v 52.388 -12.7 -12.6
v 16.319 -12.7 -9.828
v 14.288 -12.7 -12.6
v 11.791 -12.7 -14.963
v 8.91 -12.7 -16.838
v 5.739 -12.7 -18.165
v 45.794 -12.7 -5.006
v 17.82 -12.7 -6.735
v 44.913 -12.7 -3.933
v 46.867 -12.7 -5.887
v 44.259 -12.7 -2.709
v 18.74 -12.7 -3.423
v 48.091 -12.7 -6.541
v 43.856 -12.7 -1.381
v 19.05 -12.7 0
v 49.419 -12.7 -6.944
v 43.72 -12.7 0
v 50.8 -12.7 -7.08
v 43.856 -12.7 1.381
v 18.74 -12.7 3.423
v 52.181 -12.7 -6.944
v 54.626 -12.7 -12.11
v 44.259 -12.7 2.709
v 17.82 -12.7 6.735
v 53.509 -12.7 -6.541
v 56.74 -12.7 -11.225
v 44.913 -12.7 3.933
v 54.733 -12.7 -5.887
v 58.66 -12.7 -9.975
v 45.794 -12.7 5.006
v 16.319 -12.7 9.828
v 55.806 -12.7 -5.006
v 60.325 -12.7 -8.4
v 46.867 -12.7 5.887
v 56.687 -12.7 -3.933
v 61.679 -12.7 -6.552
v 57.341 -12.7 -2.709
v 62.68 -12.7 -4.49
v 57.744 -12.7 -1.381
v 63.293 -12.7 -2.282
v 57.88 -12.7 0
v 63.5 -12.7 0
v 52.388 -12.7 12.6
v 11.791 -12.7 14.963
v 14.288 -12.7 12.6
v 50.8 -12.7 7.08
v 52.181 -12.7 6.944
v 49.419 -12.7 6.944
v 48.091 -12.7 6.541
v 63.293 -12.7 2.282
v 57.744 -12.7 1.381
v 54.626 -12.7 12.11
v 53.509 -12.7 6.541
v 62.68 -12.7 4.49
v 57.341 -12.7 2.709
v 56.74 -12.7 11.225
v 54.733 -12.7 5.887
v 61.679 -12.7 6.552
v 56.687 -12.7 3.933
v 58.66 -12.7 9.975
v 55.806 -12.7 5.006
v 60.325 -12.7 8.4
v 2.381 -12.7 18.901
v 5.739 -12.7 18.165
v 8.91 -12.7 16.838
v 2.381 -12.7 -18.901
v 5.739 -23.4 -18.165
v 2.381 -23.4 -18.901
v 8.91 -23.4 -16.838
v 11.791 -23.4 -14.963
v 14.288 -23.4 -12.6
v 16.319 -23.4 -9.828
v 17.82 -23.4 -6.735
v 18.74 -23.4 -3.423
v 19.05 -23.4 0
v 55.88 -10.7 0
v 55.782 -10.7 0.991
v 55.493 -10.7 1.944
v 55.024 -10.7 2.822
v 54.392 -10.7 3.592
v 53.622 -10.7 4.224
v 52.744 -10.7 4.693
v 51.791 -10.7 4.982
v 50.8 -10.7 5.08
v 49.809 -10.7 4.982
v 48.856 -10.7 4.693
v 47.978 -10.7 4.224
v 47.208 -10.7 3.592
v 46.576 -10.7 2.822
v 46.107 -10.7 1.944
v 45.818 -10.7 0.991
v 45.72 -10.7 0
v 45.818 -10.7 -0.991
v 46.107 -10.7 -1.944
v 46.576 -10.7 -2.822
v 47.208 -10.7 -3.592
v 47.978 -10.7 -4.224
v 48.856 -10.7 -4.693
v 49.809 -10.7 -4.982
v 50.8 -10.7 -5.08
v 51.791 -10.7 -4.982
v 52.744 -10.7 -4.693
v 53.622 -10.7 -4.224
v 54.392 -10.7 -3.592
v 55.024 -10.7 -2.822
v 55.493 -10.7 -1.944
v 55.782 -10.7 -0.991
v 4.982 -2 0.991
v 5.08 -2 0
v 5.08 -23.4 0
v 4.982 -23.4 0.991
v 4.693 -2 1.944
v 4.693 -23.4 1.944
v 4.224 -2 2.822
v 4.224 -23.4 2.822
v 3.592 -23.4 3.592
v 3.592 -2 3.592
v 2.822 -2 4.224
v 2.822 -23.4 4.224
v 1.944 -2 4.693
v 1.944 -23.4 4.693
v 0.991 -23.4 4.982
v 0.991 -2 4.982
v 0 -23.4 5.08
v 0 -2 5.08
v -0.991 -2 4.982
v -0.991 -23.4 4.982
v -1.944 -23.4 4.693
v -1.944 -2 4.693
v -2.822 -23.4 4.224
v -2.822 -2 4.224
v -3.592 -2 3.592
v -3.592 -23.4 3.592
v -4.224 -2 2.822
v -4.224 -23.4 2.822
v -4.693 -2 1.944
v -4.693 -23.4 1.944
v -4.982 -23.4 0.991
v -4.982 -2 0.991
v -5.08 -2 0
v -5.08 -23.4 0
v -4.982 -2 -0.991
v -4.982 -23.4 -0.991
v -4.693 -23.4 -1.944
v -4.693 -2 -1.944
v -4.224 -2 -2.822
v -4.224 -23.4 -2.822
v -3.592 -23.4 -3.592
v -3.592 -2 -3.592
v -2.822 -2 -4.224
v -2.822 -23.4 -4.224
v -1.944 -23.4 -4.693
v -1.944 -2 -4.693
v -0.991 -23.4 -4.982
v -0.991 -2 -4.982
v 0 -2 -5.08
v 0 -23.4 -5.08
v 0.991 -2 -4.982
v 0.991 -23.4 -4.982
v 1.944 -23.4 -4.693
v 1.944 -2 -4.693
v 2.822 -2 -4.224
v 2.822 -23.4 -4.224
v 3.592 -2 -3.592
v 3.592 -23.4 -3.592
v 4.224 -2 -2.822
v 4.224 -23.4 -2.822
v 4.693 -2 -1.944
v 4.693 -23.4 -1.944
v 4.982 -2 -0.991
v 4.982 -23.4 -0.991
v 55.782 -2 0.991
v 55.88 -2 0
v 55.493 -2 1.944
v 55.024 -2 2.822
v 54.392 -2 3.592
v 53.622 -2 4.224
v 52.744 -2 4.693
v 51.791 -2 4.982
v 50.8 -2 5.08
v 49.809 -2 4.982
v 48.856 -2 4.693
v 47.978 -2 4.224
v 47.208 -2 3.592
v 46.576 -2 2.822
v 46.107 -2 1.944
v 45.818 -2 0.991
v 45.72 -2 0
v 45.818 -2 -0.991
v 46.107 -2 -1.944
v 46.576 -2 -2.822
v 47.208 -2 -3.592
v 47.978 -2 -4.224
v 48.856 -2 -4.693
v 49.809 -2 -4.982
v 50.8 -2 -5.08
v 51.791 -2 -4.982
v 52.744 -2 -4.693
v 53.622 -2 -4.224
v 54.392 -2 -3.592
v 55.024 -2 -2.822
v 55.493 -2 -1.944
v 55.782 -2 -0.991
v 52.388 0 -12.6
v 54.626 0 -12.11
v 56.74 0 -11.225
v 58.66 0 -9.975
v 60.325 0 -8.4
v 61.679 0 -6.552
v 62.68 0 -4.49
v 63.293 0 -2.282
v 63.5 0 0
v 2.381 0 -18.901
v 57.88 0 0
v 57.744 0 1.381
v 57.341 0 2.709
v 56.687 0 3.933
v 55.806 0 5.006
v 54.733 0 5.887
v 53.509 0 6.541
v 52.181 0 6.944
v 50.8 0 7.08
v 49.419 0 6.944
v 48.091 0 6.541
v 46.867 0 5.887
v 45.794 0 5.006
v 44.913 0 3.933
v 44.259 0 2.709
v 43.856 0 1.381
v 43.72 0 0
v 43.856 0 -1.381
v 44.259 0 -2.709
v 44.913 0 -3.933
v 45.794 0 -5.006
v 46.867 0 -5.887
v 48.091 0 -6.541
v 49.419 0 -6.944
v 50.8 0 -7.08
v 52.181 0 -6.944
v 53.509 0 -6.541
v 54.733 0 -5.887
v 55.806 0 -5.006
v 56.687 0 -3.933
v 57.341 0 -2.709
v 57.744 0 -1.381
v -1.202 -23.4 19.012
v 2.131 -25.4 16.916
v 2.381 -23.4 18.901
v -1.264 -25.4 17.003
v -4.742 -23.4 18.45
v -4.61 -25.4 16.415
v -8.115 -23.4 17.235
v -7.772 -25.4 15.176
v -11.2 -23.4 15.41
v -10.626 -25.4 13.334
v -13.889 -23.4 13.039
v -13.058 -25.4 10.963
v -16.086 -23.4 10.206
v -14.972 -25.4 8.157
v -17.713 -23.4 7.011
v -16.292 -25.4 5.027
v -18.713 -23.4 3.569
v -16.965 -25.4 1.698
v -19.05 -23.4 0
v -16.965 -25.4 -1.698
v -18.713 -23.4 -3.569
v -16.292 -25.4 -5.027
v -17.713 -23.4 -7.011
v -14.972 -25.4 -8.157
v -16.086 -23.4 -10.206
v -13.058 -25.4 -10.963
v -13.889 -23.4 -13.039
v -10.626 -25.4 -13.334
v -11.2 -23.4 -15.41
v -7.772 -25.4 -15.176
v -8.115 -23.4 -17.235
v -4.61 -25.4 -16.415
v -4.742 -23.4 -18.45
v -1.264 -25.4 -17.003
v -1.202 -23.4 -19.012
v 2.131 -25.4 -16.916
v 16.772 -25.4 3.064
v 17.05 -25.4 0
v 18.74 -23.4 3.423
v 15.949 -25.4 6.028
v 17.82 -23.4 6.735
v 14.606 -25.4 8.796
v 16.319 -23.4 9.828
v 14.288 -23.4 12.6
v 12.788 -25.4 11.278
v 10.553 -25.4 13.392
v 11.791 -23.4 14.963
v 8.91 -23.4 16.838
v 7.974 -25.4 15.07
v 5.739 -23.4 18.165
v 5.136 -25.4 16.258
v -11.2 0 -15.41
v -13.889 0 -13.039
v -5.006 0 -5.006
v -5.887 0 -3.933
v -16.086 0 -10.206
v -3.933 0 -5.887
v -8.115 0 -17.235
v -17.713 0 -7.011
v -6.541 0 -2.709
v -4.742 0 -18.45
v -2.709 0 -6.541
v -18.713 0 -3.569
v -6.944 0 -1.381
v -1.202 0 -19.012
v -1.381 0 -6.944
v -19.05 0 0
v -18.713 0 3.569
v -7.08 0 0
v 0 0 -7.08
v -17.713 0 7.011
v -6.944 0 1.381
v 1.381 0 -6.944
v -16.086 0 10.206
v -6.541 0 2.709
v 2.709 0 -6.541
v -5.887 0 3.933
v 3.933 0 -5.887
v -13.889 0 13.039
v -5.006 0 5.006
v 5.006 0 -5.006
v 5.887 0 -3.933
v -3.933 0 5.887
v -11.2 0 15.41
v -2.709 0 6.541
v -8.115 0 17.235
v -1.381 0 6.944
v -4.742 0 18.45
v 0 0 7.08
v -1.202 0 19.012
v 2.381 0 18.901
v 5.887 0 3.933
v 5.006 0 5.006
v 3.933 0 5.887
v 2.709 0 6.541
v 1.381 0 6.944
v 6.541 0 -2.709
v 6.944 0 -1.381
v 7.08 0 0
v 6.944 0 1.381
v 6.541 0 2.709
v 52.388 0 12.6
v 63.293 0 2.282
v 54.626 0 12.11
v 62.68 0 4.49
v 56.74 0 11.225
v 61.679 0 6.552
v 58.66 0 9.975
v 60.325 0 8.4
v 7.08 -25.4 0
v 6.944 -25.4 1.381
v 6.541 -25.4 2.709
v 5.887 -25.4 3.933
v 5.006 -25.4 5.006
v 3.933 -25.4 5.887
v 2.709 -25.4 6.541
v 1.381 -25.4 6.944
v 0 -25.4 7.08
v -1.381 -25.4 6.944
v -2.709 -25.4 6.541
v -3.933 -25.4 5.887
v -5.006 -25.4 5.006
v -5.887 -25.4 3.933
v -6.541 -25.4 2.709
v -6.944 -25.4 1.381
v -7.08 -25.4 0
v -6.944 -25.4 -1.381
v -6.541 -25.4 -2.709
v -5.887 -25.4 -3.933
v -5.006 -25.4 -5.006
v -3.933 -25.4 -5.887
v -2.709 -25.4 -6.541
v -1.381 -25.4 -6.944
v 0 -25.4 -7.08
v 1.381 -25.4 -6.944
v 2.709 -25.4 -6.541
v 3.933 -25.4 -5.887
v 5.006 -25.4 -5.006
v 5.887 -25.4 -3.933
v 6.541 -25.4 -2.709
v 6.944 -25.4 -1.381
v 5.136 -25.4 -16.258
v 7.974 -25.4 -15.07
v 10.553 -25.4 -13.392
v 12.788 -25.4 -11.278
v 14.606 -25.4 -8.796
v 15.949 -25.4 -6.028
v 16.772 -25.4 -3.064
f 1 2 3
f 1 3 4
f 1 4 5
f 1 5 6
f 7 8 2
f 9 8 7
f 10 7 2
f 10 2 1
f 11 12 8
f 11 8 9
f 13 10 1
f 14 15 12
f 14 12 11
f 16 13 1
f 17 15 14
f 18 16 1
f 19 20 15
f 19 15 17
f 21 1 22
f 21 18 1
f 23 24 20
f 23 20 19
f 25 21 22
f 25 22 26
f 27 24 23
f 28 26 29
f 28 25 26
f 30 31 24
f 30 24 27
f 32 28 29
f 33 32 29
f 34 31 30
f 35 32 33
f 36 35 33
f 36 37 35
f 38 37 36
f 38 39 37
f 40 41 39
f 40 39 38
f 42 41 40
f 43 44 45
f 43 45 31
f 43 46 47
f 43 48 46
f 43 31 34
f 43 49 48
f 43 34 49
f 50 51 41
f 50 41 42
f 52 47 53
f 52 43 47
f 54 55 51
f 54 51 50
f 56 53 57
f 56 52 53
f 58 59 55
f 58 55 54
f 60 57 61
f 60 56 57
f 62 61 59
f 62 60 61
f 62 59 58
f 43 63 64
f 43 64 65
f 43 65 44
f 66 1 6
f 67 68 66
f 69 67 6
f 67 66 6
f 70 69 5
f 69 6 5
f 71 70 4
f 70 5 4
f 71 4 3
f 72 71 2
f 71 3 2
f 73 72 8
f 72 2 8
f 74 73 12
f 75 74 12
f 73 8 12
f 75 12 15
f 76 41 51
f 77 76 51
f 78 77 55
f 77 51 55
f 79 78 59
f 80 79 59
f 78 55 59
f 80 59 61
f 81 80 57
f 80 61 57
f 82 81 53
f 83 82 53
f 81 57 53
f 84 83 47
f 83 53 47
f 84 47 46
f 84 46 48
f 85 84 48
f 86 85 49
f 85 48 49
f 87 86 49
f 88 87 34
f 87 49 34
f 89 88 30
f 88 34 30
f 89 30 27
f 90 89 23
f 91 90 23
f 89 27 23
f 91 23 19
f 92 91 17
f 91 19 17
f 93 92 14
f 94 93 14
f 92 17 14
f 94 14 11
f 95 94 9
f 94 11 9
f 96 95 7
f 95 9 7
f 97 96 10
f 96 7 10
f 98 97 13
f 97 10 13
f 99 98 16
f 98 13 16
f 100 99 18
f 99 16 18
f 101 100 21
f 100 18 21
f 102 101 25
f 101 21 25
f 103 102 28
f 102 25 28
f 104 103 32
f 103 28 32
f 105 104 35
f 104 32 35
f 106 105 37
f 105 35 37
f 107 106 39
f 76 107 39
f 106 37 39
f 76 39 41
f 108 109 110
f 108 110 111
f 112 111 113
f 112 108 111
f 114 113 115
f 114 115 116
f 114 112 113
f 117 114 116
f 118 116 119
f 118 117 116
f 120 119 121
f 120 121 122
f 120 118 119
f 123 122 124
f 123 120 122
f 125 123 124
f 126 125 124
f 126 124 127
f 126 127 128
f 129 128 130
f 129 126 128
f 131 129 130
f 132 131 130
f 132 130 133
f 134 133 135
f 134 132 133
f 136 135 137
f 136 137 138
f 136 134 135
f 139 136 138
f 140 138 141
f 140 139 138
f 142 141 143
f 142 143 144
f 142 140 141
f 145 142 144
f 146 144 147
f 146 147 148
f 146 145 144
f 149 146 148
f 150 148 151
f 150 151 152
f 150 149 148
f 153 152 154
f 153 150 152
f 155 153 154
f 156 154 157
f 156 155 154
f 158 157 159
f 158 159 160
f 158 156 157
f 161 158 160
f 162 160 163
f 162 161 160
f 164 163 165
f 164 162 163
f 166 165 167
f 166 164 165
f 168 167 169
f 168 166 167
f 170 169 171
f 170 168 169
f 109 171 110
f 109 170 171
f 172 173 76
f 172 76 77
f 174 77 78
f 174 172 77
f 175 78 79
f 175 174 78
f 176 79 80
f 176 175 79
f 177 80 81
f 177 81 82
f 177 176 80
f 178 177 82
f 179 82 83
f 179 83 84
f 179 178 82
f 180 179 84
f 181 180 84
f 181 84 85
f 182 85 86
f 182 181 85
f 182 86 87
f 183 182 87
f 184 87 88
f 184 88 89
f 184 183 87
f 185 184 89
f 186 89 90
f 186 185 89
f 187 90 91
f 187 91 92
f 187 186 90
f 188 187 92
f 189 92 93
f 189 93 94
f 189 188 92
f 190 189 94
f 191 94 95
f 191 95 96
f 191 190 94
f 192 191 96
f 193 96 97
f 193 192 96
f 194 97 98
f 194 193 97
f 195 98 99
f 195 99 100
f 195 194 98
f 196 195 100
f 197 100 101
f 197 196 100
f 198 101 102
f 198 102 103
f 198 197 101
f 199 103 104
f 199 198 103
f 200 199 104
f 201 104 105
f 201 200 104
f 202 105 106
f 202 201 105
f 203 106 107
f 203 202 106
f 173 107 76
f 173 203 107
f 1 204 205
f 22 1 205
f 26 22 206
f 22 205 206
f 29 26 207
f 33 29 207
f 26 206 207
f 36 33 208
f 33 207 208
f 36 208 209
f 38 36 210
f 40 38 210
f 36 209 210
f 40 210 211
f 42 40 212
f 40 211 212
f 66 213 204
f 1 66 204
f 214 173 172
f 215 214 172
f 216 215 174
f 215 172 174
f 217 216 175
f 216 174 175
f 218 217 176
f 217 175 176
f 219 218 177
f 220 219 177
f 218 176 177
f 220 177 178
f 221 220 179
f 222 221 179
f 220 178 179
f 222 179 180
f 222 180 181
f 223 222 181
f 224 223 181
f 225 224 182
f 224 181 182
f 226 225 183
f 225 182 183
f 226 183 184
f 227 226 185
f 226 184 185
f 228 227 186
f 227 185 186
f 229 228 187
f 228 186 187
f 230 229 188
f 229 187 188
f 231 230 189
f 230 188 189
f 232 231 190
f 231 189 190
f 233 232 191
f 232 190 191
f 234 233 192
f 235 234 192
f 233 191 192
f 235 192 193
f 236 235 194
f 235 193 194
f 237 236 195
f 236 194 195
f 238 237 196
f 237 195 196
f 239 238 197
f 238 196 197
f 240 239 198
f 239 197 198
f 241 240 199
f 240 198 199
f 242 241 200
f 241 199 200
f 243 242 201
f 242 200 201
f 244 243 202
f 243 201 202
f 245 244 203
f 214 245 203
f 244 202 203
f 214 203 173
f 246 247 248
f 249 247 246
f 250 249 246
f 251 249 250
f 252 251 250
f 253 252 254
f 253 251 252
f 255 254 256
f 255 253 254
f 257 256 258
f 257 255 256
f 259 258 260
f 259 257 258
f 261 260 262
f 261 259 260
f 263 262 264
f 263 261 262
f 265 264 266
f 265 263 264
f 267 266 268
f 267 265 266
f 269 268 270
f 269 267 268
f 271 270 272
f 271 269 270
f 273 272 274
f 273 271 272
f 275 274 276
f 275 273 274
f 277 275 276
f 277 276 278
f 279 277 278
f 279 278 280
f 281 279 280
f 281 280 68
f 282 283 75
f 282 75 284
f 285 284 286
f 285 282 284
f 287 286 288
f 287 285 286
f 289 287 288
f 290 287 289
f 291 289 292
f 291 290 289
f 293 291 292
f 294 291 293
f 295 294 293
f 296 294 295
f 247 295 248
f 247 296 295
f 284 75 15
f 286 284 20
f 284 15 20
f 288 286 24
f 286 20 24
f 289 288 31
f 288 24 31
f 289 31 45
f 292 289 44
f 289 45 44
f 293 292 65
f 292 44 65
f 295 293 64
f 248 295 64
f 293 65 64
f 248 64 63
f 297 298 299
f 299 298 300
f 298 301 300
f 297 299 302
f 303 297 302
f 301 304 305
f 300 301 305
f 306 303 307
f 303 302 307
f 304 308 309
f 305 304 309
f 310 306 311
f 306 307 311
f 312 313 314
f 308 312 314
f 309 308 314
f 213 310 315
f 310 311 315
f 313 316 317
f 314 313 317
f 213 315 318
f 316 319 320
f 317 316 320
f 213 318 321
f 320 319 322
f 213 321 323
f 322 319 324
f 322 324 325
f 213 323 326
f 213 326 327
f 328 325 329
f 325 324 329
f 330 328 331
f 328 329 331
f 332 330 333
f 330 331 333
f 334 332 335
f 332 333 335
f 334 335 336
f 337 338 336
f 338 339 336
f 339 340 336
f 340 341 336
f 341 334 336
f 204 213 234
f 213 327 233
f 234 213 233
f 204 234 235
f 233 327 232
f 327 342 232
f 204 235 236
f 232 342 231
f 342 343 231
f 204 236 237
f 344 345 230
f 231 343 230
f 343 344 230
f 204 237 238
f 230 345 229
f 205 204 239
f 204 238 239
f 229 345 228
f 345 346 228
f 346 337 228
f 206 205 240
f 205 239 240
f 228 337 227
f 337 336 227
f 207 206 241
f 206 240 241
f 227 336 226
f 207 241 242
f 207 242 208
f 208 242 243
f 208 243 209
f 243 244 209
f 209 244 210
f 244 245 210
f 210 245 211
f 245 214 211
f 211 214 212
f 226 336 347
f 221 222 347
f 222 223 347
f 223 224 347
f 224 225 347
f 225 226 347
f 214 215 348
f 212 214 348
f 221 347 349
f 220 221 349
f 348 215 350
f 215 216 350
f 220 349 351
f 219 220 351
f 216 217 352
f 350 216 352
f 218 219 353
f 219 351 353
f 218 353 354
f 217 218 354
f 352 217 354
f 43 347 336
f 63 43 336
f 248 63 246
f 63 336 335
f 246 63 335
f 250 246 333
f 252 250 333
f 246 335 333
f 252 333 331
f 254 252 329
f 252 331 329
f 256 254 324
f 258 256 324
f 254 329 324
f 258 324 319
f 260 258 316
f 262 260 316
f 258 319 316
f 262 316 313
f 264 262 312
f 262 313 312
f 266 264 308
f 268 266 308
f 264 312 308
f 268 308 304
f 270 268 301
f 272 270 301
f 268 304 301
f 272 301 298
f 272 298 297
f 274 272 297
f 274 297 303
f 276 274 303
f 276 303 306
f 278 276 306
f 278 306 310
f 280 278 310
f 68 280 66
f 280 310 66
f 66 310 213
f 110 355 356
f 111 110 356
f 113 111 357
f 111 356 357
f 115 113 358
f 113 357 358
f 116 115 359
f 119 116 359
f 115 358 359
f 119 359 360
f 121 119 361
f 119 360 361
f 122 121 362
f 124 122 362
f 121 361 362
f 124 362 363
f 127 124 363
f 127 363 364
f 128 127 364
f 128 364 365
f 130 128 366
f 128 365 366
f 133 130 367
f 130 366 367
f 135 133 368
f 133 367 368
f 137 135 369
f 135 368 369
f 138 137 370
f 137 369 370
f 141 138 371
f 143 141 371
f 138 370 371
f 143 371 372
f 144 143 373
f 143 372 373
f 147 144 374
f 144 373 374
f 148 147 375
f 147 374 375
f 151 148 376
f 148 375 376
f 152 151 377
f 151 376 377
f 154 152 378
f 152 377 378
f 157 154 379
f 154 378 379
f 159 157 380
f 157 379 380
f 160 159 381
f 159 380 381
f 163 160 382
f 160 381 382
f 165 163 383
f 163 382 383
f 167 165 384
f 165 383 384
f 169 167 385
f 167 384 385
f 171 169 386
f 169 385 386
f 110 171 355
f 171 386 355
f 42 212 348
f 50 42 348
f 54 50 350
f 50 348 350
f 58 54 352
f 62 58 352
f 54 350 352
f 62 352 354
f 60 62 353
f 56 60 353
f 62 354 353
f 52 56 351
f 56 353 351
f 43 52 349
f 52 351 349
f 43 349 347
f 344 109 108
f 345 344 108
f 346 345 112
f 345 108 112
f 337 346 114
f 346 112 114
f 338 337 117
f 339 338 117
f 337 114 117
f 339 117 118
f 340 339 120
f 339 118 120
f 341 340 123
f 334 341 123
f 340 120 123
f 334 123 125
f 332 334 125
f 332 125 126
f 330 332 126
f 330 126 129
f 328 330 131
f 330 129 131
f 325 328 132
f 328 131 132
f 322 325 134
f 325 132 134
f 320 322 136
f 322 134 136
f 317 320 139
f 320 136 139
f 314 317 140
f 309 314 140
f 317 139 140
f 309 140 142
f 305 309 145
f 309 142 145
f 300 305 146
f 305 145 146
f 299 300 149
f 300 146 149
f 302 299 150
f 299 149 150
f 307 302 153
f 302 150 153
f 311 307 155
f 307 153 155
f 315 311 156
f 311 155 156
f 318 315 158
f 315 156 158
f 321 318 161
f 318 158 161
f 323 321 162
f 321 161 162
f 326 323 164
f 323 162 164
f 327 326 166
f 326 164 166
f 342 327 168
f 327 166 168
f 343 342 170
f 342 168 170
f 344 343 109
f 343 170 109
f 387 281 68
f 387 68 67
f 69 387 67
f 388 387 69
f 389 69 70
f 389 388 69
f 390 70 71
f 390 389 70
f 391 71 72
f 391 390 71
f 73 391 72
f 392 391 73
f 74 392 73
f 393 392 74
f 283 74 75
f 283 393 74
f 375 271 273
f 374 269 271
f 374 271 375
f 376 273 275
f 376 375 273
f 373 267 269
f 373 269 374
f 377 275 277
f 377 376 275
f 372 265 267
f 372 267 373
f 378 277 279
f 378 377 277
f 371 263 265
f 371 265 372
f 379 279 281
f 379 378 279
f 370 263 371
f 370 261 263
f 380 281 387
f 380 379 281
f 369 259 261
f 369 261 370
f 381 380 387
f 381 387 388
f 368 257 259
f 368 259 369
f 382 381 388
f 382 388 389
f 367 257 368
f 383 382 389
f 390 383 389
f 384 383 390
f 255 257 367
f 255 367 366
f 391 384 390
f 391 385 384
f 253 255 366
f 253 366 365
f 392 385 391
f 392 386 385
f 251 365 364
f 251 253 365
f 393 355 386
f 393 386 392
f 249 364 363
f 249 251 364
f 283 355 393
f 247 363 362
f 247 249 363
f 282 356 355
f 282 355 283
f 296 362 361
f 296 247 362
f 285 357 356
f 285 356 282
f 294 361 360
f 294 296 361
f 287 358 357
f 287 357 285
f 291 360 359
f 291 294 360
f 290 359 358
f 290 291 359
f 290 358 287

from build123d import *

# Parameters (mm, degrees)
F0_R     = 5.08
F1_DEPTH = 12.7
F2_DEPTH = 25.4
F3_SIZE  = 2


with BuildPart() as f1:
    # F0 (on Front) → F1 (new body)
    with BuildSketch(Plane.XZ):
        with BuildLine():
            ThreePointArc((2.38125, -18.900586), (14.2875, -12.600391), (19.05, 0))
            ThreePointArc((19.05, 0), (14.2875, 12.600391), (2.38125, 18.900586))
            ThreePointArc((2.38125, 18.900586), (-19.05, 0), (2.38125, -18.900586))
        make_face()
        Circle(F0_R, mode=Mode.SUBTRACT)
        with BuildLine():
            ThreePointArc((2.38125, 18.900586), (14.2875, 12.600391), (19.05, 0))
            ThreePointArc((19.05, 0), (14.2875, -12.600391), (2.38125, -18.900586))
            Line((2.38125, -18.900586), (52.3875, -12.600391))
            ThreePointArc((52.3875, -12.600391), (38.1, 0), (52.3875, 12.600391))
            Line((52.3875, 12.600391), (2.38125, 18.900586))
        make_face()
        with BuildLine():
            ThreePointArc((63.5, 0), (60.325, 8.40026), (52.3875, 12.600391))
            ThreePointArc((52.3875, 12.600391), (38.1, 0), (52.3875, -12.600391))
            ThreePointArc((52.3875, -12.600391), (60.325, -8.40026), (63.5, 0))
        make_face()
        with Locations((50.8, 0)):
            Circle(F0_R, mode=Mode.SUBTRACT)
    extrude(amount=F1_DEPTH)

    # F0 (on Front) → F2 (join)
    with BuildSketch(Plane.XZ):
        with BuildLine():
            ThreePointArc((2.38125, -18.900586), (14.2875, -12.600391), (19.05, 0))
            ThreePointArc((19.05, 0), (14.2875, 12.600391), (2.38125, 18.900586))
            ThreePointArc((2.38125, 18.900586), (-19.05, 0), (2.38125, -18.900586))
        make_face()
        Circle(F0_R, mode=Mode.SUBTRACT)
    extrude(amount=F2_DEPTH)

    # F3
    f3_edges = [f1.edges().sort_by_distance(p)[0] for p in [
        (-5.08, -25.4, 0),
        (-2.38125, -25.4, 18.900586),
        (45.72, -12.7, 0),
        (-5.08, 0, 0),
        (45.72, 0, 0),
    ]]
    chamfer(f3_edges, length=F3_SIZE)


solid = f1.part
